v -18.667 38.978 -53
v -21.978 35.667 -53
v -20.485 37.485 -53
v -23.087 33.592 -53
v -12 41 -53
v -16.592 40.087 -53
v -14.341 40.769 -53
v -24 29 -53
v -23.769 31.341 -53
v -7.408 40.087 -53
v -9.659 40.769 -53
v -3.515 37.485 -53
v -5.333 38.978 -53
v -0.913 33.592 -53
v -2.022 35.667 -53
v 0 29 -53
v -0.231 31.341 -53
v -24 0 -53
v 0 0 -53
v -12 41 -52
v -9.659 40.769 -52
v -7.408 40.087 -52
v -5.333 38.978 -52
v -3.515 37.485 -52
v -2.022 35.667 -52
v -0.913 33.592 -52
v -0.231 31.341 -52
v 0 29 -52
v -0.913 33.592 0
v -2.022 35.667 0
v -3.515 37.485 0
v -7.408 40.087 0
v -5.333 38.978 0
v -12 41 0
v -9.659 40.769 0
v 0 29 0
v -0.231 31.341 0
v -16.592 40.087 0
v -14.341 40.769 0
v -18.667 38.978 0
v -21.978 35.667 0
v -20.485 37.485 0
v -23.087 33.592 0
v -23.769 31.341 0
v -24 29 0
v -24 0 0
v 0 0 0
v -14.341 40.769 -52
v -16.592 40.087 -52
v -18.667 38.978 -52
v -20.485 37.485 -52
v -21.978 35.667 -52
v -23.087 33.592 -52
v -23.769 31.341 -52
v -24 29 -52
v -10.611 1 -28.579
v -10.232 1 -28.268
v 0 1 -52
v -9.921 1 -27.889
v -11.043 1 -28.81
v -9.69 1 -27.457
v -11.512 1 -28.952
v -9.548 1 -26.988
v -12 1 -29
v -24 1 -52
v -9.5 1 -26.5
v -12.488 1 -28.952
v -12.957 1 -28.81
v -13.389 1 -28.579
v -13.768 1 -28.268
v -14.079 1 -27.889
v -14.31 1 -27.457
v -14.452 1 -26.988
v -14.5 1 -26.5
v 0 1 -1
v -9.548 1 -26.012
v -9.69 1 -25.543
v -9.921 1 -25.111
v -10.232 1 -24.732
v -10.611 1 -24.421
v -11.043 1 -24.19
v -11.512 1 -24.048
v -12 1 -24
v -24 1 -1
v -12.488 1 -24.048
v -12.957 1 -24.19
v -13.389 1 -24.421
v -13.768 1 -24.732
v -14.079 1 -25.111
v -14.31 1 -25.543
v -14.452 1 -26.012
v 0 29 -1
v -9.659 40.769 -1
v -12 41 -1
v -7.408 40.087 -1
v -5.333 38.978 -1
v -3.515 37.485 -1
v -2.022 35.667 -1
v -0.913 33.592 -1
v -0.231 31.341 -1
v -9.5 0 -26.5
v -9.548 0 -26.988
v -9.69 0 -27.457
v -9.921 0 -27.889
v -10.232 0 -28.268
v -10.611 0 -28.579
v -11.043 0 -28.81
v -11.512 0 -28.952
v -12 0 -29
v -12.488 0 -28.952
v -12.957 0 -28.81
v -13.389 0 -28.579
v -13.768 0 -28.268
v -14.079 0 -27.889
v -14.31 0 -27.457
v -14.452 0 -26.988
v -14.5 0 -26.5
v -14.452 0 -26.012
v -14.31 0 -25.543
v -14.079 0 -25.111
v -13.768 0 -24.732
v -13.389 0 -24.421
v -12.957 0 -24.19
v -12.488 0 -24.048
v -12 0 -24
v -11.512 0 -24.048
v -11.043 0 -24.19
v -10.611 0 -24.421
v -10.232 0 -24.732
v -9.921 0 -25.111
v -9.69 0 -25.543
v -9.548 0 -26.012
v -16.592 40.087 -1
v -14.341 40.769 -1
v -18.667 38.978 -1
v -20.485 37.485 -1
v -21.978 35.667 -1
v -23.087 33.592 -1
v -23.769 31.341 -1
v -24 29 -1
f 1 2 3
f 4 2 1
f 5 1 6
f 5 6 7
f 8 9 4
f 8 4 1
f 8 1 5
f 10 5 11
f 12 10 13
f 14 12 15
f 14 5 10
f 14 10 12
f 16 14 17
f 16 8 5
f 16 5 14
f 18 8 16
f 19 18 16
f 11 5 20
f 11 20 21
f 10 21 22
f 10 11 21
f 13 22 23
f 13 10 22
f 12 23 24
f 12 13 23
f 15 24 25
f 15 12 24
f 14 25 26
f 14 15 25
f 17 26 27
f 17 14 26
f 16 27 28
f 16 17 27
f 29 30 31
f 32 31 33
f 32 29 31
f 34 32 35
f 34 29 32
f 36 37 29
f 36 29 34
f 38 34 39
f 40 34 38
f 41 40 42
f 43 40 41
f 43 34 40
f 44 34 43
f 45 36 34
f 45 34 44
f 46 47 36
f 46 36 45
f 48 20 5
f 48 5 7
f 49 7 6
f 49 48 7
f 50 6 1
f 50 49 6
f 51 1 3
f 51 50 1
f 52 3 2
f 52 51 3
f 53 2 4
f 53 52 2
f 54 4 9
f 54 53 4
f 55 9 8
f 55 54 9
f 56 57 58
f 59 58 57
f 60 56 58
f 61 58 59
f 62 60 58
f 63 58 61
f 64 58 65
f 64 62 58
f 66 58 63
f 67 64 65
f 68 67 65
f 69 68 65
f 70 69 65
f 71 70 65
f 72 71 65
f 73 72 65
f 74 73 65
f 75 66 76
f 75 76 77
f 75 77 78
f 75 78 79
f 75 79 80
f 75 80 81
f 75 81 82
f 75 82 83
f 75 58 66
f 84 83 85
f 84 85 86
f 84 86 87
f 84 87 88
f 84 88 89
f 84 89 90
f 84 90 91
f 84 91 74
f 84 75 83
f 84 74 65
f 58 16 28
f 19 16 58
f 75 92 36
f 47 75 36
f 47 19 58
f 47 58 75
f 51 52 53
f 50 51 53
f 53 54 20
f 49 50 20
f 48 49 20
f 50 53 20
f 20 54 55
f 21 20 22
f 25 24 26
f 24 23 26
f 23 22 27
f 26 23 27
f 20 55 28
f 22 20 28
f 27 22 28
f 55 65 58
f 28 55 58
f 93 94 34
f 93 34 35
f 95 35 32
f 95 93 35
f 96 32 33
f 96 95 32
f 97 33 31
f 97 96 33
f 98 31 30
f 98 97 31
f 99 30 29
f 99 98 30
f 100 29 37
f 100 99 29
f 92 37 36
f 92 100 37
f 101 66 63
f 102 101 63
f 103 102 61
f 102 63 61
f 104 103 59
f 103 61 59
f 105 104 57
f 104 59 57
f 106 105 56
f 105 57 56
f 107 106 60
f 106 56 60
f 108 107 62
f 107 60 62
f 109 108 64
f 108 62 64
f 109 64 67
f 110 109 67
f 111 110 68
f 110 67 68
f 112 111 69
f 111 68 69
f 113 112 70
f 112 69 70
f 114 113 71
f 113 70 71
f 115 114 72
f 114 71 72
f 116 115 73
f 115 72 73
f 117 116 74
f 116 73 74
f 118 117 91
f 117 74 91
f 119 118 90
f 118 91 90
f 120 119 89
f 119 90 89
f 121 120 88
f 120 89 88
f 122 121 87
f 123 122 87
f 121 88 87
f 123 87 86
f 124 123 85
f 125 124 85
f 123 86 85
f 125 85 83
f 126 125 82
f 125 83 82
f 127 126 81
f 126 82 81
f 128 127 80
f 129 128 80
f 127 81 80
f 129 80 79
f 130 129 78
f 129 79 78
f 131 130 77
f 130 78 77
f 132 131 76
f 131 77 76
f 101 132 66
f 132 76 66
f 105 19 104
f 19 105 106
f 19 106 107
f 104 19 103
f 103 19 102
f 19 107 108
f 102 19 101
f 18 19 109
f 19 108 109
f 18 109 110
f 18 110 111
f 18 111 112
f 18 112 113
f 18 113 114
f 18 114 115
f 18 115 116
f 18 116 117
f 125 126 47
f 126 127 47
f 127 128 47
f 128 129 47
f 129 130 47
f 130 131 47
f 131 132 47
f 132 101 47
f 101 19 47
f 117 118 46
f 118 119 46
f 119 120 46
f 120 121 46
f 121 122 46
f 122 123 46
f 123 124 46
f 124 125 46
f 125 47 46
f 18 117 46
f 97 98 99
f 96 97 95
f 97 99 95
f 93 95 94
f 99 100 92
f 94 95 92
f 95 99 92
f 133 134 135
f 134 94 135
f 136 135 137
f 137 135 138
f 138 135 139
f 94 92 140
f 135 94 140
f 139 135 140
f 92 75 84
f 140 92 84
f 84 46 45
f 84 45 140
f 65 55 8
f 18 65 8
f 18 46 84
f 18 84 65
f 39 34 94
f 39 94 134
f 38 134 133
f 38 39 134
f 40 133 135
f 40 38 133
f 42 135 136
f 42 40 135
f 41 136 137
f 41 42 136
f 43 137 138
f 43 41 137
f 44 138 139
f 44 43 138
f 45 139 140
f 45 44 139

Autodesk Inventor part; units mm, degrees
ref_plane "YZ Plane" through (0, 0, 0) normal (1, 0, 0) x (0, 1, 0)
ref_plane "XZ Plane" through (0, 0, 0) normal (0, 1, 0) x (-1, 0, 0)
ref_plane "XY Plane" through (0, 0, 0) normal (0, 0, 1) x (1, 0, 0)
sketch "Sketch1" plane through (0, 0, 0) normal (0, 1, 0) x (-1, 0, 0)
  line L0 (0, 0) -> (24, 0)
  line L1 (24, 0) -> (24, -53)
  line L2 (24, -53) -> (0, -53)
  line L3 (0, -53) -> (0, 0)
  dimension "d0" = 24
  dimension "d1" = 53
extrude "Extrusion1" add sketch "Sketch1" along normal blind 1
sketch "Sketch2" plane through (0, 1, 0) normal (0, 1, 0) x (1, 0, 0)
  line L0 (-24, 0) -> (0, 0) projected
  line L1 (0, 0) -> (0, 53) projected
  line L2 (-24, 53) -> (-24, 0) projected
  line L3 (-24, 0) -> (0, 0)
  line L4 (0, 0) -> (0, 1)
  line L5 (0, 1) -> (-24, 1)
  line L6 (-24, 1) -> (-24, 0)
  line L7 (0, 53) -> (-24, 53)
  line L8 (-24, 53) -> (-24, 52)
  line L9 (-24, 52) -> (0, 52)
  line L10 (0, 52) -> (0, 53)
  dimension "d4" = 1
  dimension "d5" = 1
extrude "Extrusion2" add sketch "Sketch2" along normal blind 40 contours L2 L5 L1 L0 | L2 L7 L1 L9
fillet "Fillet1" radius 12 4 edges at (0, 41, -52.5) (-24, 41, -52.5) (0, 41, -0.5) (-24, 41, -0.5)
sketch "Sketch3" plane through (0, 1, 0) normal (0, 1, 0) x (1, 0, 0)
  line L0 (0, 1) -> (0, 52) projected
  line L1 (-24, 52) -> (-24, 1) projected
  line L2 (-24, 26.5) -> (0, 26.5)
  circle A0 centre (-12, 26.5) radius 2.5
  point P0 (0, 0)
  dimension "d9" = 5
extrude "Extrusion3" cut sketch "Sketch3" against normal blind 40
properties part number "Wrist U-Plate"
